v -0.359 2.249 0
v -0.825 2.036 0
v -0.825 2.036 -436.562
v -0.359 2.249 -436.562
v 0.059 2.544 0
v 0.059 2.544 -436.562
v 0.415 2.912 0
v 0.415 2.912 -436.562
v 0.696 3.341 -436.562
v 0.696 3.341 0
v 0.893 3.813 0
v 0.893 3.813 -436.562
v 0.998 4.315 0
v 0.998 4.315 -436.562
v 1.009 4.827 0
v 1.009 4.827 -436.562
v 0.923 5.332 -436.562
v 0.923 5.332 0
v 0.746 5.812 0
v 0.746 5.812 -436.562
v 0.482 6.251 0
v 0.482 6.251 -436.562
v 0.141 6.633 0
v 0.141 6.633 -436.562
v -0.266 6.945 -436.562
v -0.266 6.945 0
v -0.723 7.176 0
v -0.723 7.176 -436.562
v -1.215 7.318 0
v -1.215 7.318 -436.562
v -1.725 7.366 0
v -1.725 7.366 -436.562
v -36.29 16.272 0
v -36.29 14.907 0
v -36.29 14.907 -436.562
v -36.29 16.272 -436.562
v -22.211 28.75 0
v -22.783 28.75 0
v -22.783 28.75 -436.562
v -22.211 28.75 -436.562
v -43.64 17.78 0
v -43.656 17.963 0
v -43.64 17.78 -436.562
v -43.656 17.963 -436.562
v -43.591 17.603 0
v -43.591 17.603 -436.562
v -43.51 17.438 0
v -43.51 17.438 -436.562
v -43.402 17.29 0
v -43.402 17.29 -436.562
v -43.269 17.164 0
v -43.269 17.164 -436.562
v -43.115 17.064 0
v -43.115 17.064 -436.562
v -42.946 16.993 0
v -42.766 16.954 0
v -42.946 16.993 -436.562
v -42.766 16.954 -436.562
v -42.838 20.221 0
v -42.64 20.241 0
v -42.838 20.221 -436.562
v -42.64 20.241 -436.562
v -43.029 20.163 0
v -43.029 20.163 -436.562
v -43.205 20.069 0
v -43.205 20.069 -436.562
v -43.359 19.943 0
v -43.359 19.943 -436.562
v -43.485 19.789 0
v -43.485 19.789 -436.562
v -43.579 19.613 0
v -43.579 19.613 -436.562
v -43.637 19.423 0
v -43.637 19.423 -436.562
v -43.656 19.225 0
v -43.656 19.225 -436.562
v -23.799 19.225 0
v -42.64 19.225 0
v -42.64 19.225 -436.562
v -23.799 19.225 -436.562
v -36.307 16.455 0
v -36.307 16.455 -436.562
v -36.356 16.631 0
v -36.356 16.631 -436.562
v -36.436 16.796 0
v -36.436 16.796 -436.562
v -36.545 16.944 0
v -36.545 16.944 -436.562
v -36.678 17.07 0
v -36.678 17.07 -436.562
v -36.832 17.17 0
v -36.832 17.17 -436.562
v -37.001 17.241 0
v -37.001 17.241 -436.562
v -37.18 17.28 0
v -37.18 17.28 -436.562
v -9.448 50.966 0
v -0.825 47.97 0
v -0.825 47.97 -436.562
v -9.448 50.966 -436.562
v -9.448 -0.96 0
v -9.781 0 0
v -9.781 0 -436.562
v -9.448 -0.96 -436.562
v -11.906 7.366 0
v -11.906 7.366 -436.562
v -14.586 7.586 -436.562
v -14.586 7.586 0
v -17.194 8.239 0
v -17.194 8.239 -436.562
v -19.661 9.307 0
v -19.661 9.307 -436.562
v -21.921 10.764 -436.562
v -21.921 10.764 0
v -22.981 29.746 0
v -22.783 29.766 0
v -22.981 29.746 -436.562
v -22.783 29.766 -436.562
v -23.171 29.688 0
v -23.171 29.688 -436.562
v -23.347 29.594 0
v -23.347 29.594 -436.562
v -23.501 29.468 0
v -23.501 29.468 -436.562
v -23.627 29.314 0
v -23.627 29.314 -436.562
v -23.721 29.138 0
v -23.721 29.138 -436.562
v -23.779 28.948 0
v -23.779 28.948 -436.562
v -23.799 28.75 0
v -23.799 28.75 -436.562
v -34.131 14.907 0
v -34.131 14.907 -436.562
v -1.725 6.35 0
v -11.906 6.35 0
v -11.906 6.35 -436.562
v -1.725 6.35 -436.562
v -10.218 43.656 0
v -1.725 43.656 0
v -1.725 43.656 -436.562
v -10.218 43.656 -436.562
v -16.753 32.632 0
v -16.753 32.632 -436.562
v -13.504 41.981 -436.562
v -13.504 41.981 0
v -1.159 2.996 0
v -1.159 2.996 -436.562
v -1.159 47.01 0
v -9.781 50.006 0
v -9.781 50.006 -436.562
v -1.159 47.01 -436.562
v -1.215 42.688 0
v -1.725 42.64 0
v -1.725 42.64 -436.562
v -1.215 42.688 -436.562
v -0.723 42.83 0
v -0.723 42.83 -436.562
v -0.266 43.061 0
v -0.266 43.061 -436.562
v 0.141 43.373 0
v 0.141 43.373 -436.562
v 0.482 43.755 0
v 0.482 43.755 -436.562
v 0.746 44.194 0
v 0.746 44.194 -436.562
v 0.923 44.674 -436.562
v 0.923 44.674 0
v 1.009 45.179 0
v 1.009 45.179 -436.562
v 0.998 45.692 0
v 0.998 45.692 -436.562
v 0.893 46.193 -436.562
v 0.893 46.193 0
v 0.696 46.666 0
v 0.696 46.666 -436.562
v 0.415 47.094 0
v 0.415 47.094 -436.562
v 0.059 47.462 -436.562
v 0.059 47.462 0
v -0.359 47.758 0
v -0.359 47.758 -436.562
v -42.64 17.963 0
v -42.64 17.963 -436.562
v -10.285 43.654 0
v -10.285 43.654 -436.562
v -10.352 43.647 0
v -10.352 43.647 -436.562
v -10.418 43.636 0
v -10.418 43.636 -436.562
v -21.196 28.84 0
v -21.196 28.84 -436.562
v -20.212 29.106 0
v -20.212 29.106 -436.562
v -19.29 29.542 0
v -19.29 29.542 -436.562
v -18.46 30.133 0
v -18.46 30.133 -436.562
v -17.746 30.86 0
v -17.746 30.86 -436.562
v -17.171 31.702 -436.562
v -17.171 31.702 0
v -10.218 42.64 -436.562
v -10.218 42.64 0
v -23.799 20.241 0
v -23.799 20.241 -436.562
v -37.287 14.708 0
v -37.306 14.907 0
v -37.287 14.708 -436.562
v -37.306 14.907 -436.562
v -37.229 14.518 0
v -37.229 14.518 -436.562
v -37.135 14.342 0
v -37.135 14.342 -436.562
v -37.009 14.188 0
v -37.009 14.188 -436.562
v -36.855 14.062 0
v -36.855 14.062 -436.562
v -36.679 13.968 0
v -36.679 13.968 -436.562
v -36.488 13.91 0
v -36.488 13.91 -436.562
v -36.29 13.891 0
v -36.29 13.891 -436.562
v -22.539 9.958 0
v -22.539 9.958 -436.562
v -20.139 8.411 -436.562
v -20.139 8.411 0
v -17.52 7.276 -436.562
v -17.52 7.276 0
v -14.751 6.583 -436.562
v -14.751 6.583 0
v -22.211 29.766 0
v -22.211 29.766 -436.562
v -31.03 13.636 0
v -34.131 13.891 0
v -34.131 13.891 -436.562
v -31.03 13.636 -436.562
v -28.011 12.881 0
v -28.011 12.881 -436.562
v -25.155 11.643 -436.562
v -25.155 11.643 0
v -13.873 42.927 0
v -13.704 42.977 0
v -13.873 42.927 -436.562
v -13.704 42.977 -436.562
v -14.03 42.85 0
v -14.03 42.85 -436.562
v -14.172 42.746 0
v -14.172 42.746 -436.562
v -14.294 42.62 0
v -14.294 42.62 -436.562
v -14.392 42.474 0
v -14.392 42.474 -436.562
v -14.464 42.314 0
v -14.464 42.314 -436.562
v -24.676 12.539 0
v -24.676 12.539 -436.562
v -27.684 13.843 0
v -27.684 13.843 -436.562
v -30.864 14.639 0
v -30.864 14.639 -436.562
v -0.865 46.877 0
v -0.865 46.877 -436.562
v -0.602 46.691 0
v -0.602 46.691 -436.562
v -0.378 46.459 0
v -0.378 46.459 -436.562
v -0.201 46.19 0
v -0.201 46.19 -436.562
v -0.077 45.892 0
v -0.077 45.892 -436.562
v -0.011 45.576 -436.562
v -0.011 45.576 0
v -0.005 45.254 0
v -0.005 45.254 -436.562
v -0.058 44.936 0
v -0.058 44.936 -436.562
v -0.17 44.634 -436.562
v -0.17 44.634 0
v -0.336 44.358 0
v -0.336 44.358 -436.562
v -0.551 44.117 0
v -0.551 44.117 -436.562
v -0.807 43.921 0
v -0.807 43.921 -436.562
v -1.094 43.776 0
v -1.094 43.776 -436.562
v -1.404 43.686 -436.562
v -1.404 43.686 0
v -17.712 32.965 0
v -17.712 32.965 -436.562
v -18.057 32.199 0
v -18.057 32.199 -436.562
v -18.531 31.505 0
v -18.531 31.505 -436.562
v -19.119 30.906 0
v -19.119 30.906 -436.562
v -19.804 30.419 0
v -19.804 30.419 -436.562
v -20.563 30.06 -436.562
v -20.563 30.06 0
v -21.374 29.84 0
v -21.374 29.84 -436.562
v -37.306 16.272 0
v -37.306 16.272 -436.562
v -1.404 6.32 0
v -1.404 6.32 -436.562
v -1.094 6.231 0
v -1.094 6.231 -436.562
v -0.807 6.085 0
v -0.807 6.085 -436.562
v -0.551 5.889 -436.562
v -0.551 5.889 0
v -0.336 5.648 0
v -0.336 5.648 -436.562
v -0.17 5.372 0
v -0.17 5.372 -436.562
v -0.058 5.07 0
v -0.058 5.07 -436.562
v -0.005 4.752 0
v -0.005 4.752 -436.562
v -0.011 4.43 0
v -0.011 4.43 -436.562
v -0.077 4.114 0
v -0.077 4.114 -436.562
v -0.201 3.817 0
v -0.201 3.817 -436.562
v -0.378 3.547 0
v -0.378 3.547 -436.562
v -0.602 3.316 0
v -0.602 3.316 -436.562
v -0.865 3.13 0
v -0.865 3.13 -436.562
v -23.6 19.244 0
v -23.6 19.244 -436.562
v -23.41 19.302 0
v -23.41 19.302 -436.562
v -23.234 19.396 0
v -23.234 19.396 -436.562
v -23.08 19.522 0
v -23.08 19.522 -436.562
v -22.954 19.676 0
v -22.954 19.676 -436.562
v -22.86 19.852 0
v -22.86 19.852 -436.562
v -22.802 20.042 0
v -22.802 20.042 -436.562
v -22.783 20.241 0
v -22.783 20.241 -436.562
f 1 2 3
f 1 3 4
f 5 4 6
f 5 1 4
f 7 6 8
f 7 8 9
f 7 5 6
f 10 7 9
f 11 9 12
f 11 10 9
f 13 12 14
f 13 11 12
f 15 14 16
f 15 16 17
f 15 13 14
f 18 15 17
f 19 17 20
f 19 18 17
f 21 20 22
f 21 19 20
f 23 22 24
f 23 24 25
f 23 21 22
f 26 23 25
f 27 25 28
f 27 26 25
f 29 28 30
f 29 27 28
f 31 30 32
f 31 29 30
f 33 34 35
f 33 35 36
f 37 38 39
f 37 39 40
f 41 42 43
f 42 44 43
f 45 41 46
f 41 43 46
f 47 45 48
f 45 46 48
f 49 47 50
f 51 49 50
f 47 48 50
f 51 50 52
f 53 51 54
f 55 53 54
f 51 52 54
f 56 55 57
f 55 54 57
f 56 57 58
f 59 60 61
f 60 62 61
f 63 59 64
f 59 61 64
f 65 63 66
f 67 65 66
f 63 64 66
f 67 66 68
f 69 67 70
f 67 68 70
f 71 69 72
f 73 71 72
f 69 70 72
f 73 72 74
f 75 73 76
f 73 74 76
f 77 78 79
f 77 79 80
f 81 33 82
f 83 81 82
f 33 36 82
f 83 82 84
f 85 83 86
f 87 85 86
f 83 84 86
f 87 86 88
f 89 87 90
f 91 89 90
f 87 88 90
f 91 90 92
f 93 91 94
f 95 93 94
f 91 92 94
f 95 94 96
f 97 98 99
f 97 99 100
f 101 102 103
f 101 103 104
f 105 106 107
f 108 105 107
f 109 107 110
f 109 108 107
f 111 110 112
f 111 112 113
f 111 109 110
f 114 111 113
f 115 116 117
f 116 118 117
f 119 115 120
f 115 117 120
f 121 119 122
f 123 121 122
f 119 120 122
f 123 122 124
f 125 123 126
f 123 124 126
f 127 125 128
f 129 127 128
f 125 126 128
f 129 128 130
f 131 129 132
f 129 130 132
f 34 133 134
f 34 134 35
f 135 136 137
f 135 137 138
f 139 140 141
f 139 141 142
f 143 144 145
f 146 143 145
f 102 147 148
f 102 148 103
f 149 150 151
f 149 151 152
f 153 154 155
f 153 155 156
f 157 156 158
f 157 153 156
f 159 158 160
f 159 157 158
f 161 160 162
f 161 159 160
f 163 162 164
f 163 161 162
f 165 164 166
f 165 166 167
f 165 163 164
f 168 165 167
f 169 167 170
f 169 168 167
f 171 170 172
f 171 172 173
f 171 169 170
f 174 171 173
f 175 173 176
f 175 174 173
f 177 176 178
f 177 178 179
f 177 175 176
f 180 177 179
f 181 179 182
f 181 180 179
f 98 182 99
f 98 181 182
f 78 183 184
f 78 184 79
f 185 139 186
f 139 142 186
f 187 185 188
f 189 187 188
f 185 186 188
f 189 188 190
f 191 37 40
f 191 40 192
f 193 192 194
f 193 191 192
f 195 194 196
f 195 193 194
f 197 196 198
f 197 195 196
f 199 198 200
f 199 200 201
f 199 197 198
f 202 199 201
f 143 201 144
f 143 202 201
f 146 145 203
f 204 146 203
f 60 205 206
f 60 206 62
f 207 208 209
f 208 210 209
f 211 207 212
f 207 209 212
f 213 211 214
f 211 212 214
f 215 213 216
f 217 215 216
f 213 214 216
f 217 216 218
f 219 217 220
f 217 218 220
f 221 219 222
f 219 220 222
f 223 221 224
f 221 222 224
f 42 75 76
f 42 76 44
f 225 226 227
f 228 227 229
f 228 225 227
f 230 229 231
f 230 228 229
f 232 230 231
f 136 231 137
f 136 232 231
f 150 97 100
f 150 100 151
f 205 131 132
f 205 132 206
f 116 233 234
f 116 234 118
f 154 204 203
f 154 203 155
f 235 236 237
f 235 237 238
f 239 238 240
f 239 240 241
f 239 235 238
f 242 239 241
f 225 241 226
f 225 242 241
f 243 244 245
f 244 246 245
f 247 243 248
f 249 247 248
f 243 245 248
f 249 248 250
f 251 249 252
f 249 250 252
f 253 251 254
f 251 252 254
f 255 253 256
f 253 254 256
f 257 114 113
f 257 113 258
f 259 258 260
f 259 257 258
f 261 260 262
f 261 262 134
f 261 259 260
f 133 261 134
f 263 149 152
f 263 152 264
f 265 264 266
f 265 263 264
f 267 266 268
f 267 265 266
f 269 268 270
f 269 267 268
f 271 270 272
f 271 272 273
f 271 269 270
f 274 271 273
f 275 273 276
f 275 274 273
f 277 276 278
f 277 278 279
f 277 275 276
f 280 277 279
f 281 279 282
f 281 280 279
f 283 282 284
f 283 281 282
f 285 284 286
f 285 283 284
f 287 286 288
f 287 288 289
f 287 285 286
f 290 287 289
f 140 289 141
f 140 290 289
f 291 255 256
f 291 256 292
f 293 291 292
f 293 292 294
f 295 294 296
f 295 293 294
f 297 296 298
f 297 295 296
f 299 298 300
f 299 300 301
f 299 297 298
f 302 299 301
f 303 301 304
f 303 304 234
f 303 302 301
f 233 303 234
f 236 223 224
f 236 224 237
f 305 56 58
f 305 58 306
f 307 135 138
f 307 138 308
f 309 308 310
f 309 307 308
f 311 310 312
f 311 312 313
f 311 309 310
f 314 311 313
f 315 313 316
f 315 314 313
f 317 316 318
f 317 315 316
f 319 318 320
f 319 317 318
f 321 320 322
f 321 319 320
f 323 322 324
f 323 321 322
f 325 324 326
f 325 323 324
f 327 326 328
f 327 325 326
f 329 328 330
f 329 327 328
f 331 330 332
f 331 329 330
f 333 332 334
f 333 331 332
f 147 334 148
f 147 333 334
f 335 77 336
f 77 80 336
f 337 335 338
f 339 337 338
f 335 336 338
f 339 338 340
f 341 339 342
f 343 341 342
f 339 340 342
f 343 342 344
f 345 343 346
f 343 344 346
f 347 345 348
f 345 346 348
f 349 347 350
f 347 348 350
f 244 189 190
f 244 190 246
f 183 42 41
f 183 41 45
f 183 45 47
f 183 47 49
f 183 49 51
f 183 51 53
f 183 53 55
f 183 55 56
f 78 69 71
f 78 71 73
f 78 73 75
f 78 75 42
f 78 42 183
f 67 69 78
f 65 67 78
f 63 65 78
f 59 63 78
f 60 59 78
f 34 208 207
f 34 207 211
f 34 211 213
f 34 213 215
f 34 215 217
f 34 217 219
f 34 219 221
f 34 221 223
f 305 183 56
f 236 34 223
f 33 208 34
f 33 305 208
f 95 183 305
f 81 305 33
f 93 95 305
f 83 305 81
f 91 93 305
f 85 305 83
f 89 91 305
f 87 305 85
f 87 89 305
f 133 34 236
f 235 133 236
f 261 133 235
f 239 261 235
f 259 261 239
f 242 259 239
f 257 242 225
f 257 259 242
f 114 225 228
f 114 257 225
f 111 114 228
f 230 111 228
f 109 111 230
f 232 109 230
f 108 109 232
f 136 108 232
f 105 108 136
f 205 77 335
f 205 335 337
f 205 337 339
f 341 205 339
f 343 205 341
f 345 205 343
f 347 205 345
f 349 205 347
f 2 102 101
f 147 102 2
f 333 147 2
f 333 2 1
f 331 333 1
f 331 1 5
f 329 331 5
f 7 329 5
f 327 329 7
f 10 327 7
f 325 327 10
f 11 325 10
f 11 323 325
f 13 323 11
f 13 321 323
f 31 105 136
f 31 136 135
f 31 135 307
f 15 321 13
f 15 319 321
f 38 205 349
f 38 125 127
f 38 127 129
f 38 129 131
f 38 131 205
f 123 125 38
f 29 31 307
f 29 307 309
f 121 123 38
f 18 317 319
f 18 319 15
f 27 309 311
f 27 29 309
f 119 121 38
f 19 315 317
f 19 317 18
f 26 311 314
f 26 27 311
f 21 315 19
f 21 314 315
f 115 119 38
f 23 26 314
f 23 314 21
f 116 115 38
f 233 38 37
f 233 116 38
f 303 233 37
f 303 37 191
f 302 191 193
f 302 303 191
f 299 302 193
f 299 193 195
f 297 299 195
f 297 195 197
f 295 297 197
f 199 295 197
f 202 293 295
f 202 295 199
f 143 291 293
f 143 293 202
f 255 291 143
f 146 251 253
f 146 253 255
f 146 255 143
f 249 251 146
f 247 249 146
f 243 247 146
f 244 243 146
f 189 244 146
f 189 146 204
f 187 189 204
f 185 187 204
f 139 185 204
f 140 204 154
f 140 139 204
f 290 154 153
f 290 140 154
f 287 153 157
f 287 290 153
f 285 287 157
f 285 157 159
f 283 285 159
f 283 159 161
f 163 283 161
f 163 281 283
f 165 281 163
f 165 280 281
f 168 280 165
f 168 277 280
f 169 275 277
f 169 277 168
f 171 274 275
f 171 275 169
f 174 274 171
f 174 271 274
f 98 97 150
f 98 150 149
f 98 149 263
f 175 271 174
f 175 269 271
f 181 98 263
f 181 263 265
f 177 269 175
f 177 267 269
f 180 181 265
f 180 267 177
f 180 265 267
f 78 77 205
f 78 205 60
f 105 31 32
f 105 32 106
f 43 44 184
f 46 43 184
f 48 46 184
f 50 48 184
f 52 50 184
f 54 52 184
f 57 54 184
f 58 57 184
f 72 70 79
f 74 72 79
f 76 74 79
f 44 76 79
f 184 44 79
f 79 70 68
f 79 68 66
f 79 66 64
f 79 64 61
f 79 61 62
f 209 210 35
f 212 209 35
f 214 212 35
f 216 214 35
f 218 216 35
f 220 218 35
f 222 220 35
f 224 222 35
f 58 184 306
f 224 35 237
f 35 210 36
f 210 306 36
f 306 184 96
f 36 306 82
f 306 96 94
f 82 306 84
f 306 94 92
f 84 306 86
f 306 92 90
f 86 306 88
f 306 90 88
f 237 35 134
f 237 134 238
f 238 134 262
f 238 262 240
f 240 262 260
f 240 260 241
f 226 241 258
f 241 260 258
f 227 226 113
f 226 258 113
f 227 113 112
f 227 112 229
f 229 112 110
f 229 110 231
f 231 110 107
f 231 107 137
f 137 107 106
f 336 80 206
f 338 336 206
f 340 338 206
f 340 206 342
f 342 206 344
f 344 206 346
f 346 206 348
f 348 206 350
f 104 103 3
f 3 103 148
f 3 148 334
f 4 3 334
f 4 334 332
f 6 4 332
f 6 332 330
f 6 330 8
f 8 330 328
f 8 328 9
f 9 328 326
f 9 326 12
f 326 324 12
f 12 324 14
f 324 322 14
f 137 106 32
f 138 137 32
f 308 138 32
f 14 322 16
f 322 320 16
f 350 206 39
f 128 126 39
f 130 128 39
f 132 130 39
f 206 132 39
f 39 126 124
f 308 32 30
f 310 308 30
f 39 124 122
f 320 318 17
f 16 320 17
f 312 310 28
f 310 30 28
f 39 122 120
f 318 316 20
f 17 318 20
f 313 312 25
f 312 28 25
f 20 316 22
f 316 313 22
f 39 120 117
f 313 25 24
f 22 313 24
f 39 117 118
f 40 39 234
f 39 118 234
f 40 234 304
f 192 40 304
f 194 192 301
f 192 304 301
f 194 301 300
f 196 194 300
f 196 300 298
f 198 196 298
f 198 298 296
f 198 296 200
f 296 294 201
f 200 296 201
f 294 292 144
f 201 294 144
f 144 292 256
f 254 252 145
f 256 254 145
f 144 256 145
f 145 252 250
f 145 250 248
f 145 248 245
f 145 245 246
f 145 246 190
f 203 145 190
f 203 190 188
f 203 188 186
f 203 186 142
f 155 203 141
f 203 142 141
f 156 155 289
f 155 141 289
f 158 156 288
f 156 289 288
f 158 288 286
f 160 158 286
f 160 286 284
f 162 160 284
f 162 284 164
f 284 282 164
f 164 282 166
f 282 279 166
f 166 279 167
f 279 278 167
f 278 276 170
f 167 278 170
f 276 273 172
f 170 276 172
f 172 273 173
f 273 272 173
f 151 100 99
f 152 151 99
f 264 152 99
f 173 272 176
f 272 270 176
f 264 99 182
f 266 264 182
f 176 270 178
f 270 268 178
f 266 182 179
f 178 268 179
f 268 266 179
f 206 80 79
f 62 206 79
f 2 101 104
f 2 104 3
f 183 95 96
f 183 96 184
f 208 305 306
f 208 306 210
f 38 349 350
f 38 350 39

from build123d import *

# Parameters (mm, degrees)
EXTRUDE_THIN1_DEPTH = 436.5625
FILLET1_R           = 1.016


with BuildPart() as part:
    # Sketch1 → Extrude-Thin1 (new body)
    with BuildSketch(Plane.XY):
        with BuildLine():
            Line((9.781263434, 50.00625), (1.15875723, 47.010410758))
            ThreePointArc((1.15875723, 47.010410758), (0.024053154, 45.094051318), (1.724851264, 43.65625))
            Line((1.724851264, 43.65625), (10.31875, 43.65625))
            Line((10.31875, 43.65625), (14.273529908, 42.8625))
            Line((14.273529908, 42.8625), (17.712331019, 32.965078439))
            ThreePointArc((17.712331019, 32.965078439), (19.450830911, 30.647054561), (22.211029908, 29.765625))
            Line((22.211029908, 29.765625), (23.798529908, 29.765625))
            Line((23.798529908, 29.765625), (23.798529908, 20.240625))
            Line((23.798529908, 20.240625), (43.65625, 20.240625))
            Line((43.65625, 20.240625), (43.65625, 17.065625))
            Line((43.65625, 17.065625), (37.30625, 16.271875))
            Line((37.30625, 16.271875), (37.30625, 13.890625))
            Line((37.30625, 13.890625), (34.13125, 13.890625))
            ThreePointArc((34.13125, 13.890625), (28.010554633, 12.880569241), (22.538913712, 9.957510902))
            ThreePointArc((22.538913712, 9.957510902), (17.520243065, 7.276438204), (11.90625, 6.35))
            Line((11.90625, 6.35), (10.31875, 6.35))
            Line((10.31875, 6.35), (1.724851264, 6.35))
            ThreePointArc((1.724851264, 6.35), (0.024053154, 4.912198682), (1.15875723, 2.995839242))
            Line((1.15875723, 2.995839242), (9.781263434, 0))
            Line((9.781263434, 0), (9.447813501, -0.95972243))
            Line((9.447813501, -0.95972243), (0.825307297, 2.036116813))
            ThreePointArc((0.825307297, 2.036116813), (-0.977778666, 5.081281519), (1.724851264, 7.366))
            Line((1.724851264, 7.366), (10.31875, 7.366))
            Line((10.31875, 7.366), (11.90625, 7.366))
            ThreePointArc((11.90625, 7.366), (17.193805978, 8.238568564), (21.920655776, 10.763744817))
            ThreePointArc((21.920655776, 10.763744817), (27.684117546, 13.842699601), (34.13125, 14.906625))
            Line((34.13125, 14.906625), (36.29025, 14.906625))
            Line((36.29025, 14.906625), (36.29025, 17.168781734))
            Line((36.29025, 17.168781734), (42.64025, 17.962531734))
            Line((42.64025, 17.962531734), (42.64025, 19.224625))
            Line((42.64025, 19.224625), (22.782529908, 19.224625))
            Line((22.782529908, 19.224625), (22.782529908, 28.749625))
            Line((22.782529908, 28.749625), (22.211029908, 28.749625))
            ThreePointArc((22.211029908, 28.749625), (18.861988459, 29.819092868), (16.752608589, 32.631628506))
            Line((16.752608589, 32.631628506), (13.504357649, 41.98061609))
            Line((13.504357649, 41.98061609), (10.217797732, 42.64025))
            Line((10.217797732, 42.64025), (1.724851264, 42.64025))
            ThreePointArc((1.724851264, 42.64025), (-0.977778666, 44.924968481), (0.825307297, 47.970133187))
            Line((0.825307297, 47.970133187), (9.447813501, 50.96597243))
            Line((9.447813501, 50.96597243), (9.781263434, 50.00625))
        make_face()
    extrude(amount=-EXTRUDE_THIN1_DEPTH)

    # Fillet1
    fillet1_edges = [part.edges().sort_by_distance(p)[0] for p in [
        (36.29025, 17.168781734, -218.28125),
        (22.782529908, 19.224625, -218.28125),
        (10.31875, 43.65625, -218.28125),
        (14.273529908, 42.8625, -218.28125),
        (23.798529908, 29.765625, -218.28125),
        (43.65625, 20.240625, -218.28125),
        (43.65625, 17.065625, -218.28125),
        (37.30625, 13.890625, -218.28125),
    ]]
    fillet(fillet1_edges, radius=FILLET1_R)


with BuildPart() as body_2:
    # Mirror1: mirrored copy
    add(part.part.mirror(Plane(origin=(0, 0, 0), x_dir=(0, 0, 1), z_dir=(1, 0, 0))))


solid = body_2.part
